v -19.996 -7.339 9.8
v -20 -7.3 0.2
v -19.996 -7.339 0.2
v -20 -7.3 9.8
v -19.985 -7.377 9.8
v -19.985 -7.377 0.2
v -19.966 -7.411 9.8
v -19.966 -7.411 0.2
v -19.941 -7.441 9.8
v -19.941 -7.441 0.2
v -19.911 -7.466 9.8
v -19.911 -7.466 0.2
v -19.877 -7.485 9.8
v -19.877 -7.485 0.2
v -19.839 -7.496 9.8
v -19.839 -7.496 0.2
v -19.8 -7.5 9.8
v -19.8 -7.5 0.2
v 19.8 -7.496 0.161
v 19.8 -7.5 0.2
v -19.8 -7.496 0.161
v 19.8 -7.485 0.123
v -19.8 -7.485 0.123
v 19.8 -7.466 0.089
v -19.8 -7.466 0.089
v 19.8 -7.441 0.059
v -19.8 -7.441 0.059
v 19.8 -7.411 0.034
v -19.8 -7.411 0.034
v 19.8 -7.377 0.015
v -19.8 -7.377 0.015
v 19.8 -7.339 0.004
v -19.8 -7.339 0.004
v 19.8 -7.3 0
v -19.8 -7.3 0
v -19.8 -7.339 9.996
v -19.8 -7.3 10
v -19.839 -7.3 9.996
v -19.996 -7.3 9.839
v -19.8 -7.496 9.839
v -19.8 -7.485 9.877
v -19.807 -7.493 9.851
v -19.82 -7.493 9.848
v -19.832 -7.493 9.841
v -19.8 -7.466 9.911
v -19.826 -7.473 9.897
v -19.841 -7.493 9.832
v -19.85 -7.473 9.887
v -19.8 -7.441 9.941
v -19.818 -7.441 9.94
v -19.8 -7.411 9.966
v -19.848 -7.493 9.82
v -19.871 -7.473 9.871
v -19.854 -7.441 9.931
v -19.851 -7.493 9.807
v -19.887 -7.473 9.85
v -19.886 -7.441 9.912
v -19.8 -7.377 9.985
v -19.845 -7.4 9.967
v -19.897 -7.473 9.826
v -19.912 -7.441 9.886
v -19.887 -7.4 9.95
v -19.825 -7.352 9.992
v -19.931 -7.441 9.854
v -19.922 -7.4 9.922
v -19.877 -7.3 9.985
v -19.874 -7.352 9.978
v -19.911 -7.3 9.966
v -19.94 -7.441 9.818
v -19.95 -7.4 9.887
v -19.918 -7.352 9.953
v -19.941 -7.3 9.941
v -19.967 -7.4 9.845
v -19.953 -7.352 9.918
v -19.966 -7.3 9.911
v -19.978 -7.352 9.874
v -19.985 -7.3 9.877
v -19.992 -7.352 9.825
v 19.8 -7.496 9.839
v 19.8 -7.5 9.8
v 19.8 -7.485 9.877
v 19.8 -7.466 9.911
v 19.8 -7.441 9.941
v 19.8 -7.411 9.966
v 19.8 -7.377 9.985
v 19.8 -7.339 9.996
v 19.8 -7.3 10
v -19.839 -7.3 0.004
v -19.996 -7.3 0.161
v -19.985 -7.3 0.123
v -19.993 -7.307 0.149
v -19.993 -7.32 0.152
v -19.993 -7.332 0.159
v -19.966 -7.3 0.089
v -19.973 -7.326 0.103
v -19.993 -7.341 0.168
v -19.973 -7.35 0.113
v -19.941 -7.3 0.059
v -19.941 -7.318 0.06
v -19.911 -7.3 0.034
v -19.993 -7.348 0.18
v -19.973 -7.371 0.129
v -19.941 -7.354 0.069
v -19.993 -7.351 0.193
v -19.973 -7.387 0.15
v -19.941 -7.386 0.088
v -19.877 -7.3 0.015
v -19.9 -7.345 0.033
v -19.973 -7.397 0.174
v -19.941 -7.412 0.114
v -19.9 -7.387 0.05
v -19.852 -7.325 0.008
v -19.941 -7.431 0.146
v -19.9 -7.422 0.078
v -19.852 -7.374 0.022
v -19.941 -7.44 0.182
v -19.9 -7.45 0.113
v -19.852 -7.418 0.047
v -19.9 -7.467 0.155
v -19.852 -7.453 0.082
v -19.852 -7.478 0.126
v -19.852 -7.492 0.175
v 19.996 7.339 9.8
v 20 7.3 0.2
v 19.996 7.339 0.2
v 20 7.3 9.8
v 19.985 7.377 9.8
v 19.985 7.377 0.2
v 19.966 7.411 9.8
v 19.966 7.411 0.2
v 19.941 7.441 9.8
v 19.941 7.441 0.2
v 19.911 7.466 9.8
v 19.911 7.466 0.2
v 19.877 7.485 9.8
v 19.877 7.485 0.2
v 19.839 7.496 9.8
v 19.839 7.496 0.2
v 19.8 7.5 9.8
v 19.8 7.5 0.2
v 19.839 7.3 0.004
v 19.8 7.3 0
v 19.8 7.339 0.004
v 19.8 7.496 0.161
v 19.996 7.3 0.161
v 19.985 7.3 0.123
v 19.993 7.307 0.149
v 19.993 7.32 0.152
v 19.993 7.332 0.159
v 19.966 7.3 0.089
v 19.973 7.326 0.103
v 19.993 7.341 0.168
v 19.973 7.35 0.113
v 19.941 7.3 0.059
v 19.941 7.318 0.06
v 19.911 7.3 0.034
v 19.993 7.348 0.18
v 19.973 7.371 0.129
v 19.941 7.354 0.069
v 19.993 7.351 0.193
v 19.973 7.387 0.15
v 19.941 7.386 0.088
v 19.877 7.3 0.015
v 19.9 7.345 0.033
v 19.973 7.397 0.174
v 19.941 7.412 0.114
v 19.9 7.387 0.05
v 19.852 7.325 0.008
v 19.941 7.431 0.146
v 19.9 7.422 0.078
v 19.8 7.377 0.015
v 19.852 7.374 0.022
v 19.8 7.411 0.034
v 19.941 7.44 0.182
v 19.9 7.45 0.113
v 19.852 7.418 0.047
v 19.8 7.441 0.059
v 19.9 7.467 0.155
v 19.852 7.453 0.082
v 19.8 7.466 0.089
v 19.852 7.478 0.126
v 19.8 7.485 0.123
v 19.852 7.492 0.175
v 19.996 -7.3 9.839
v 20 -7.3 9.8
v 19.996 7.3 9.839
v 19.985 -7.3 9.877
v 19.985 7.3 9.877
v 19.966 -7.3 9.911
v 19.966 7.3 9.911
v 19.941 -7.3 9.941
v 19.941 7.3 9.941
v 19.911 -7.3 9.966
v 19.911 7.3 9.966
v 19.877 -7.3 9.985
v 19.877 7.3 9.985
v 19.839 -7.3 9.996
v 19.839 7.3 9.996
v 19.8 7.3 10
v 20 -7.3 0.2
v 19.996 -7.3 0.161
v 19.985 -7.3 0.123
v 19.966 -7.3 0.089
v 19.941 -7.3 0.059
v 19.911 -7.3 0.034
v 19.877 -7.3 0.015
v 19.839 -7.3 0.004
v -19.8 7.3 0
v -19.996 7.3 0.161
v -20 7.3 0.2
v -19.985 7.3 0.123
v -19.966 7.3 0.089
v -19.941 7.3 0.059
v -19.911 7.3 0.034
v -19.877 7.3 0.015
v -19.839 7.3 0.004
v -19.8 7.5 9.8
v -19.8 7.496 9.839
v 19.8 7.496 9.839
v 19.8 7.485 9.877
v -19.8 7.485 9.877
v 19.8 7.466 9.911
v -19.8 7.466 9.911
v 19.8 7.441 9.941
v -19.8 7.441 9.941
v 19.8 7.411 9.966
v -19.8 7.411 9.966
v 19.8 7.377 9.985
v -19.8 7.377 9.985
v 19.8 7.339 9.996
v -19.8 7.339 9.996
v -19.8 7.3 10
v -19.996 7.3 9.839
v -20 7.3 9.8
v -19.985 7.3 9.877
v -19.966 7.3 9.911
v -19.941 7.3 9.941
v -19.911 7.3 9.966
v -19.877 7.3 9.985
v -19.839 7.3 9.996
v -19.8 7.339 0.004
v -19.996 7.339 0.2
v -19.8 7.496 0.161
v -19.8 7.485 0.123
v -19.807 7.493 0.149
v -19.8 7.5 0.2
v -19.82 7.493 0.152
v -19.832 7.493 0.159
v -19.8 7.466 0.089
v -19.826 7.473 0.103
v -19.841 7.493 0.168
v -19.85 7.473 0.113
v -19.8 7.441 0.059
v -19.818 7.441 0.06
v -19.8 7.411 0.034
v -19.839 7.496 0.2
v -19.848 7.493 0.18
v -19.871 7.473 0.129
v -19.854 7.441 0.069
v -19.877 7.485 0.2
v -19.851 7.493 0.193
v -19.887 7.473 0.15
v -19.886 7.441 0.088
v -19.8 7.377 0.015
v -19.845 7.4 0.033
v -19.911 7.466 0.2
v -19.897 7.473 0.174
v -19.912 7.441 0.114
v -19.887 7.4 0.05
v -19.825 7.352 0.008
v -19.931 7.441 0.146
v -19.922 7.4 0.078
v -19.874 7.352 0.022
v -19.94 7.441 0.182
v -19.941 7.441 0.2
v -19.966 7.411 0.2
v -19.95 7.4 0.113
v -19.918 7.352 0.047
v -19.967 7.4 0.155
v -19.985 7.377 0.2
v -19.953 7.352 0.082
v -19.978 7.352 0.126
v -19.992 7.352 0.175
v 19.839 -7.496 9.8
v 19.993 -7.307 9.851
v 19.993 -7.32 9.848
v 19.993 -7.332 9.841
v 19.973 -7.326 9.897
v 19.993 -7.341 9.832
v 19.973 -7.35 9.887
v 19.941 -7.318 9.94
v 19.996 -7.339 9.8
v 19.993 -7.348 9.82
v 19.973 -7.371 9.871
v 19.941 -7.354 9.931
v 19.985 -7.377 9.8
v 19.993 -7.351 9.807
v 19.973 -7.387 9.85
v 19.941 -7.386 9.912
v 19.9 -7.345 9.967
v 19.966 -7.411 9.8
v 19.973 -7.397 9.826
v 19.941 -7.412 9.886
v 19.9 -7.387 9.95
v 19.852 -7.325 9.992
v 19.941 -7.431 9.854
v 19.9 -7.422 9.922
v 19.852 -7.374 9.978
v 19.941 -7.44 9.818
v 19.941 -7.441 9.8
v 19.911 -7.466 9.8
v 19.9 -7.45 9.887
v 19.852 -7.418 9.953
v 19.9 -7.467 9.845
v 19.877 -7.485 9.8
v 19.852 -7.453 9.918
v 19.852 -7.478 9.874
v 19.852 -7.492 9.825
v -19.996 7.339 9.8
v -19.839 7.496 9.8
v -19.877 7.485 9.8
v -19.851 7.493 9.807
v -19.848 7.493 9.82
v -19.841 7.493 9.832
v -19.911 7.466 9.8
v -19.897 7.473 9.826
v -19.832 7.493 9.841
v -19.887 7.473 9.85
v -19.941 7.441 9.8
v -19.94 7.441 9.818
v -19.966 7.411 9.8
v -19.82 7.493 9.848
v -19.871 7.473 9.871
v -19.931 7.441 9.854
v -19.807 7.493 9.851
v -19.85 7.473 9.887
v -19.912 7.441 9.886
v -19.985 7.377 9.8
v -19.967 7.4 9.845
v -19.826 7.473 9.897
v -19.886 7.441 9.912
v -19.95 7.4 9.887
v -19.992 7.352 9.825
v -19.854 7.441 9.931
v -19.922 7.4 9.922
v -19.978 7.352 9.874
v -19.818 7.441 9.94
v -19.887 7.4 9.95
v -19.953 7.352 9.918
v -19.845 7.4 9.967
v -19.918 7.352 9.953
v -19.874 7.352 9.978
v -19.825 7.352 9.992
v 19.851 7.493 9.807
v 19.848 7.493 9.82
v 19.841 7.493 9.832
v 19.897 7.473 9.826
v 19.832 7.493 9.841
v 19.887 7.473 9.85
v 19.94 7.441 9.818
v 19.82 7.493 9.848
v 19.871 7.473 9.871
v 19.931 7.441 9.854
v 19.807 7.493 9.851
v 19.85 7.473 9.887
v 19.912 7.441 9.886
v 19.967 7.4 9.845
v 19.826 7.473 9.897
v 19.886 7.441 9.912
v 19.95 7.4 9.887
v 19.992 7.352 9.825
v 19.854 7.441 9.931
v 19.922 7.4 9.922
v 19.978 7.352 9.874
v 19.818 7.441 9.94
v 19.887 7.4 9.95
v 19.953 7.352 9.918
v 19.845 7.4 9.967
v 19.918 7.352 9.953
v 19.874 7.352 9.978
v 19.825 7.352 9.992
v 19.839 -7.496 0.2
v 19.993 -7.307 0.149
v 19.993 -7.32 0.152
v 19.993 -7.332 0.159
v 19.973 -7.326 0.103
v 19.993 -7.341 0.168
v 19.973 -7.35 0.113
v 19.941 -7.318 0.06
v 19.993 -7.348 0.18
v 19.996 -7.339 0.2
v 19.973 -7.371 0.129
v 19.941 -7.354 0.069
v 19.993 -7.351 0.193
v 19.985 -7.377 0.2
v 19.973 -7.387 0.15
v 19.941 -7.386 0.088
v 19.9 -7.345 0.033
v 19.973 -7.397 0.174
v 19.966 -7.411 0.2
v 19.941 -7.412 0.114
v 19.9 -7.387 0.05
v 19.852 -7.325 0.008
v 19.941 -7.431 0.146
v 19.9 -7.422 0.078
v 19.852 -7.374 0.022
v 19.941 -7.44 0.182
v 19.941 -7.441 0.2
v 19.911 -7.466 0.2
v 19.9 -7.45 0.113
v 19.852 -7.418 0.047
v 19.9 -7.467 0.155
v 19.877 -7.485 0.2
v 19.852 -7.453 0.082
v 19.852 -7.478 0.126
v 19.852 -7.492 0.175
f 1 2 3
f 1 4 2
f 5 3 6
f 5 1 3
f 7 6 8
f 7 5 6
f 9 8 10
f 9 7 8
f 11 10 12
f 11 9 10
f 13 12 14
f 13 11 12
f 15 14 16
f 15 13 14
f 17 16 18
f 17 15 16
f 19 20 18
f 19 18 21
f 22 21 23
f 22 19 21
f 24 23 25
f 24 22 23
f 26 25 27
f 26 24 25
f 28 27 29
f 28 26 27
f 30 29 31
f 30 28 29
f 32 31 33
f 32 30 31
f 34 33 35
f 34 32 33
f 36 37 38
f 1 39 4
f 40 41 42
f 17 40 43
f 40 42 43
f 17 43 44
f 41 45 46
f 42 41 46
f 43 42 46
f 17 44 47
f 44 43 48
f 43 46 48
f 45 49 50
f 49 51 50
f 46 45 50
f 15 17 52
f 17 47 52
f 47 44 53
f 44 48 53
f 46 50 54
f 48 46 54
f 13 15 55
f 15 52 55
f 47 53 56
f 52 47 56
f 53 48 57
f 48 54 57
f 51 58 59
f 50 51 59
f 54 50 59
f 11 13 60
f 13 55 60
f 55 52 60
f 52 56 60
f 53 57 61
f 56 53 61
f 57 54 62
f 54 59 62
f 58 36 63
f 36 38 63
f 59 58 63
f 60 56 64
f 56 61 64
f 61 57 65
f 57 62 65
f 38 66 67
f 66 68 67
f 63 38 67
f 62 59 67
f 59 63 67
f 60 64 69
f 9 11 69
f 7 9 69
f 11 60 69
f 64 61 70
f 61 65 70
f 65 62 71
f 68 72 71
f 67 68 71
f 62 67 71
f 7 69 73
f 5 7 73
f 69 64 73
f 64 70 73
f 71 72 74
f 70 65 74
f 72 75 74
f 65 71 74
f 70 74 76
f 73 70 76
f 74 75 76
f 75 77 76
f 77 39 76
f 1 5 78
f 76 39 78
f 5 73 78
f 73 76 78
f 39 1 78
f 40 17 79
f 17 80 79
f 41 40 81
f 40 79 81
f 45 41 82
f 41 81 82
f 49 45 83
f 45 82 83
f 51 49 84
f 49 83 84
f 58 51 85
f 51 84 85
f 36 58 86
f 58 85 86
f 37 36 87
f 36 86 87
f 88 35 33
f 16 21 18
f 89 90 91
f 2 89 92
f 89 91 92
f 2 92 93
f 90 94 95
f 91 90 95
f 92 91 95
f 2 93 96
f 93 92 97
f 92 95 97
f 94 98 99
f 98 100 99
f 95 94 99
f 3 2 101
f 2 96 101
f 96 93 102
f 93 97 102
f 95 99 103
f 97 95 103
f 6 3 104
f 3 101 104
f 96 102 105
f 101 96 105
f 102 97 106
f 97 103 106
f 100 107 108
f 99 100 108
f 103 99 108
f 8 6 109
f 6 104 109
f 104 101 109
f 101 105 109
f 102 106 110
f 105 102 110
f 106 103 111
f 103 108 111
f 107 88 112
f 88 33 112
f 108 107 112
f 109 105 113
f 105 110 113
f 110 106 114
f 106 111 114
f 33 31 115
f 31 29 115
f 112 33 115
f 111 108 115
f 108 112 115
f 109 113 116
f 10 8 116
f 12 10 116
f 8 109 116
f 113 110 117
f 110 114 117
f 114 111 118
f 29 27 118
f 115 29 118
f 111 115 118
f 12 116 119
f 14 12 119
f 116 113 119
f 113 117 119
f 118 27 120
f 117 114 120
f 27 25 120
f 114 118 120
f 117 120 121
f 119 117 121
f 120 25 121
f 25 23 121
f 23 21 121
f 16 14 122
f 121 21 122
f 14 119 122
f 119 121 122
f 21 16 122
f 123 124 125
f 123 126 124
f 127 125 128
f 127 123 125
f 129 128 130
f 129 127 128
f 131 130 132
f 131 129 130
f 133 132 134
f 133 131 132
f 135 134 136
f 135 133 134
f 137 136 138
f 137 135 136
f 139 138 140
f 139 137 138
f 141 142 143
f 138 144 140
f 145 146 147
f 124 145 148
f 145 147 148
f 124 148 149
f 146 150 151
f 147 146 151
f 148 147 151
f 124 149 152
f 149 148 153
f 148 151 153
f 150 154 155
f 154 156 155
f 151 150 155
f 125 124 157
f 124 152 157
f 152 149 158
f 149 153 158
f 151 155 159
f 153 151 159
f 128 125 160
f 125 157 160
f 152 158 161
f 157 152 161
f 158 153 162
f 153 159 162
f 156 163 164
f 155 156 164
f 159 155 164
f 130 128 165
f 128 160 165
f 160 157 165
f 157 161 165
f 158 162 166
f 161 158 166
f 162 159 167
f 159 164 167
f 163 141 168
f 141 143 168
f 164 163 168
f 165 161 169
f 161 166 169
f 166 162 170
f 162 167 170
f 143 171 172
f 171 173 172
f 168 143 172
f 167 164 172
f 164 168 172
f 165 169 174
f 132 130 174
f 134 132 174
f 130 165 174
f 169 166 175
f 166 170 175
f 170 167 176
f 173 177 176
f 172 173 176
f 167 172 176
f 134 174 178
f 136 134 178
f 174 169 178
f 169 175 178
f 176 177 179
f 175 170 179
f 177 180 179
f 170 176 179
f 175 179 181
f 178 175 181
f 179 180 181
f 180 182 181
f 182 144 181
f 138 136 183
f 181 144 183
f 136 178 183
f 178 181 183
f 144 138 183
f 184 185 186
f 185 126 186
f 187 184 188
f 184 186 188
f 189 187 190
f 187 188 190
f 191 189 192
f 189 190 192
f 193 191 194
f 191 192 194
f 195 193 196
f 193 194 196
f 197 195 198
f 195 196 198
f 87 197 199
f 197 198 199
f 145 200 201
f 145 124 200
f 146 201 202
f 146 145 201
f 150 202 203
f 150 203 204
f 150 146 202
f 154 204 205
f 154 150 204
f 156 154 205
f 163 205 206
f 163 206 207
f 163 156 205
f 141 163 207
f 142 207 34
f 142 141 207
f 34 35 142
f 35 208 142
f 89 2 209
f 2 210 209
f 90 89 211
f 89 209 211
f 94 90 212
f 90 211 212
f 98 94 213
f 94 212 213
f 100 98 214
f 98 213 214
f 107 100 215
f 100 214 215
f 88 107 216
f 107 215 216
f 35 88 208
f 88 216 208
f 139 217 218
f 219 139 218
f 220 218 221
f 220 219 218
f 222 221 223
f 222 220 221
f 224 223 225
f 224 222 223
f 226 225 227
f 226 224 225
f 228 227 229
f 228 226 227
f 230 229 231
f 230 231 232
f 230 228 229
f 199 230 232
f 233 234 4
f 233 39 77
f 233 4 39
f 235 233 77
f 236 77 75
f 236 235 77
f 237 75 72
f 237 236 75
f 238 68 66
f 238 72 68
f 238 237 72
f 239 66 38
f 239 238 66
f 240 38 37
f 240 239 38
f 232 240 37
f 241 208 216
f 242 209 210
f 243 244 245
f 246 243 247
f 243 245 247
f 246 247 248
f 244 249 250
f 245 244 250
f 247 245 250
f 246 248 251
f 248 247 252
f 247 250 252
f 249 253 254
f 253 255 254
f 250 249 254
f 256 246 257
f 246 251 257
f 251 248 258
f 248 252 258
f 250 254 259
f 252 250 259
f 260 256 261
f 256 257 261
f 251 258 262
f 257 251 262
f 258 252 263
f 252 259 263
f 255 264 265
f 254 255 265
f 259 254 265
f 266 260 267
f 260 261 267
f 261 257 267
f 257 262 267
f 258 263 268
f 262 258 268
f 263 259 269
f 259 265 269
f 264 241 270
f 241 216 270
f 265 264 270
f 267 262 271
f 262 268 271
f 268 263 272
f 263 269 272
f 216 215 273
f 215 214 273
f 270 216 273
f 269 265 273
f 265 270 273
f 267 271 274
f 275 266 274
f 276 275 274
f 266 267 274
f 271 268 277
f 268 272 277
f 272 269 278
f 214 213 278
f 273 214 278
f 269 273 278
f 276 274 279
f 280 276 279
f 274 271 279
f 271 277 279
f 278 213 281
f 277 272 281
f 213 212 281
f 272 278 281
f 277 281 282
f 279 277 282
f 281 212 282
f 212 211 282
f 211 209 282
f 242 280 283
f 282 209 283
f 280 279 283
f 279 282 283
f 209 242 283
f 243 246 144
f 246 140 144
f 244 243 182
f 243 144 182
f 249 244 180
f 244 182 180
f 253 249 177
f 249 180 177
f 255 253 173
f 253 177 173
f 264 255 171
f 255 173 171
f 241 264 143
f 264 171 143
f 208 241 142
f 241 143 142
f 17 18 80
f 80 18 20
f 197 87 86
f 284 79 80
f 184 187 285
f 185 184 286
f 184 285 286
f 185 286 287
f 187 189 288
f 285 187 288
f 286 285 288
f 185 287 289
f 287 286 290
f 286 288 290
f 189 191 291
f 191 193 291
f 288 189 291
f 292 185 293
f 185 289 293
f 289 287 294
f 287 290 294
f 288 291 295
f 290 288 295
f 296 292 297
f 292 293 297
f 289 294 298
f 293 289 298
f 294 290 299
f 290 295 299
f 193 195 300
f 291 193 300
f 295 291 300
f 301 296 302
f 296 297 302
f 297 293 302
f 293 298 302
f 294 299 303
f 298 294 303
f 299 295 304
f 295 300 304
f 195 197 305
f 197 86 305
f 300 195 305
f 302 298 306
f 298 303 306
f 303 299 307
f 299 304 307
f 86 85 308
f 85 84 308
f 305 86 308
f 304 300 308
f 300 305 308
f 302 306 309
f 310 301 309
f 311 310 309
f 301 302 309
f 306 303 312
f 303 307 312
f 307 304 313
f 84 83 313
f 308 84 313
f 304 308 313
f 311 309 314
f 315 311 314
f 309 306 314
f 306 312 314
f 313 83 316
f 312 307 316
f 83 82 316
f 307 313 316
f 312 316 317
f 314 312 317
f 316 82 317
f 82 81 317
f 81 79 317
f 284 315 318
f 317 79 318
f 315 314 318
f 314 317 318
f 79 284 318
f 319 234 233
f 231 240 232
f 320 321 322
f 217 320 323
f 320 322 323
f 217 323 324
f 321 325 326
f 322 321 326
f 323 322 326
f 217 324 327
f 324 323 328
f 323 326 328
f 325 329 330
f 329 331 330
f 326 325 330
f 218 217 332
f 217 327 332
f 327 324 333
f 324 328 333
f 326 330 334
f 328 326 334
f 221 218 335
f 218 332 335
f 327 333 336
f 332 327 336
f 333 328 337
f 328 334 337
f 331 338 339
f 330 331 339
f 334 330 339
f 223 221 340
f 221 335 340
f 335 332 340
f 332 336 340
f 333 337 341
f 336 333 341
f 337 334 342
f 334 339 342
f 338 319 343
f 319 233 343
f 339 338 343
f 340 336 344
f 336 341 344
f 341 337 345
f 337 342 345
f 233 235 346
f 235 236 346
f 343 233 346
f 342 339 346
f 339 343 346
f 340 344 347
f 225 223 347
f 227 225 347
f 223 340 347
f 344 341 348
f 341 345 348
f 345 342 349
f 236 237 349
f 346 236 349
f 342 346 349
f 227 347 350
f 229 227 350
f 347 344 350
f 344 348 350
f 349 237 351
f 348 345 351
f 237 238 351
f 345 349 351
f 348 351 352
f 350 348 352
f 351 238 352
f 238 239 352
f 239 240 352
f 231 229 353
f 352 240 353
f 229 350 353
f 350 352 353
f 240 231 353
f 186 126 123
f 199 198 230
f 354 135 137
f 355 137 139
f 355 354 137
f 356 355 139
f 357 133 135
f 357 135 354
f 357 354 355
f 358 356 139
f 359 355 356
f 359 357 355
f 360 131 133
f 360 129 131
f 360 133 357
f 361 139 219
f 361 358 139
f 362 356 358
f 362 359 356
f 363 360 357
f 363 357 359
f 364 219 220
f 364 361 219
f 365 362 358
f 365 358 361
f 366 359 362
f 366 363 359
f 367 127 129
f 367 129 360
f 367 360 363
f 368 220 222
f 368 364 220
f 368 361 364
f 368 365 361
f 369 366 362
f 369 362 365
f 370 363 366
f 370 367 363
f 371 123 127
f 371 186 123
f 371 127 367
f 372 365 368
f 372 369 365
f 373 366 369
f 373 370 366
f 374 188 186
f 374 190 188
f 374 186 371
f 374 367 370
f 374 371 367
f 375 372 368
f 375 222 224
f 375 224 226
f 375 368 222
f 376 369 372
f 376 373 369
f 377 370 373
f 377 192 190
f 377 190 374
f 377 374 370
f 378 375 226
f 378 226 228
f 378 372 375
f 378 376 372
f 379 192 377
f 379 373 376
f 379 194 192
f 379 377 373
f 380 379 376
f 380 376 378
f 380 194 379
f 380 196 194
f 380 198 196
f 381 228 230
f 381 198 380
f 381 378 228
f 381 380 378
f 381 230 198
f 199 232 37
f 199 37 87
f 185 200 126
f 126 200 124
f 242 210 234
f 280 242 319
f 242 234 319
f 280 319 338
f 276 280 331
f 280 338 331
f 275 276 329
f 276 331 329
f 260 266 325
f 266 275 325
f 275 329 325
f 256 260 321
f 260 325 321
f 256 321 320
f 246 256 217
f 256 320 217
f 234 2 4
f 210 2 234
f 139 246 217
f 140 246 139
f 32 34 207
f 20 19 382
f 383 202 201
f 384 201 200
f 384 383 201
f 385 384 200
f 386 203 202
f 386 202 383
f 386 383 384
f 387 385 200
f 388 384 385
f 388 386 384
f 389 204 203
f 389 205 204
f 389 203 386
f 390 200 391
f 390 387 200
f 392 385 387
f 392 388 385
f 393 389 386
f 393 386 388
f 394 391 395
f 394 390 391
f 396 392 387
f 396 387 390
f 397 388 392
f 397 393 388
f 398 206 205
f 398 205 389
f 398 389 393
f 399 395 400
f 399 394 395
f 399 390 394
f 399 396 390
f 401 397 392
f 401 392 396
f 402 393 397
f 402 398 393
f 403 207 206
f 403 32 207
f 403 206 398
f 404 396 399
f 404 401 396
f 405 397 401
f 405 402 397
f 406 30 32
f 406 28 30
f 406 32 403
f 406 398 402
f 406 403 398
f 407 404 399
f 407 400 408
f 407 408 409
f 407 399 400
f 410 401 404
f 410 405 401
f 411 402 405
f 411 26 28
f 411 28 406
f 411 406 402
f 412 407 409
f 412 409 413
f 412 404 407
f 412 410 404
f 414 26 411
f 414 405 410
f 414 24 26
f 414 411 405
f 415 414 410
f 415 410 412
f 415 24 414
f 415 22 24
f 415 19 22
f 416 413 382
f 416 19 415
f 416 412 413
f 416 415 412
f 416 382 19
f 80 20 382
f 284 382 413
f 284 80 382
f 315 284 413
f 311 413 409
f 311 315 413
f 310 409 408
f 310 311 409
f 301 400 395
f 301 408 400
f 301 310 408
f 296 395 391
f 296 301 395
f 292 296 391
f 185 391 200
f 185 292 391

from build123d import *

# Parameters (mm, degrees)
CROQUIS3_W              = 40
CROQUIS3_H              = 15
SALIENTE_EXTRUIR1_DEPTH = 10
REDONDEO1_R             = 0.2


with BuildPart() as part:
    # Croquis3 → Saliente-Extruir1 (new body)
    with BuildSketch(Plane.XY):
        Rectangle(CROQUIS3_W, CROQUIS3_H)
    extrude(amount=SALIENTE_EXTRUIR1_DEPTH)

    # Redondeo1
    redondeo1_edges = [part.edges().sort_by_distance(p)[0] for p in [
        (-20, 0, 10),
        (0, -7.5, 10),
        (20, 0, 10),
        (0, -7.5, 0),
        (-20, 0, 0),
        (0, 7.5, 0),
        (20, 0, 0),
        (20, -7.5, 5),
        (-20, -7.5, 5),
        (-20, 7.5, 5),
        (20, 7.5, 5),
        (0, 7.5, 10),
    ]]
    fillet(redondeo1_edges, radius=REDONDEO1_R)


solid = part.part
